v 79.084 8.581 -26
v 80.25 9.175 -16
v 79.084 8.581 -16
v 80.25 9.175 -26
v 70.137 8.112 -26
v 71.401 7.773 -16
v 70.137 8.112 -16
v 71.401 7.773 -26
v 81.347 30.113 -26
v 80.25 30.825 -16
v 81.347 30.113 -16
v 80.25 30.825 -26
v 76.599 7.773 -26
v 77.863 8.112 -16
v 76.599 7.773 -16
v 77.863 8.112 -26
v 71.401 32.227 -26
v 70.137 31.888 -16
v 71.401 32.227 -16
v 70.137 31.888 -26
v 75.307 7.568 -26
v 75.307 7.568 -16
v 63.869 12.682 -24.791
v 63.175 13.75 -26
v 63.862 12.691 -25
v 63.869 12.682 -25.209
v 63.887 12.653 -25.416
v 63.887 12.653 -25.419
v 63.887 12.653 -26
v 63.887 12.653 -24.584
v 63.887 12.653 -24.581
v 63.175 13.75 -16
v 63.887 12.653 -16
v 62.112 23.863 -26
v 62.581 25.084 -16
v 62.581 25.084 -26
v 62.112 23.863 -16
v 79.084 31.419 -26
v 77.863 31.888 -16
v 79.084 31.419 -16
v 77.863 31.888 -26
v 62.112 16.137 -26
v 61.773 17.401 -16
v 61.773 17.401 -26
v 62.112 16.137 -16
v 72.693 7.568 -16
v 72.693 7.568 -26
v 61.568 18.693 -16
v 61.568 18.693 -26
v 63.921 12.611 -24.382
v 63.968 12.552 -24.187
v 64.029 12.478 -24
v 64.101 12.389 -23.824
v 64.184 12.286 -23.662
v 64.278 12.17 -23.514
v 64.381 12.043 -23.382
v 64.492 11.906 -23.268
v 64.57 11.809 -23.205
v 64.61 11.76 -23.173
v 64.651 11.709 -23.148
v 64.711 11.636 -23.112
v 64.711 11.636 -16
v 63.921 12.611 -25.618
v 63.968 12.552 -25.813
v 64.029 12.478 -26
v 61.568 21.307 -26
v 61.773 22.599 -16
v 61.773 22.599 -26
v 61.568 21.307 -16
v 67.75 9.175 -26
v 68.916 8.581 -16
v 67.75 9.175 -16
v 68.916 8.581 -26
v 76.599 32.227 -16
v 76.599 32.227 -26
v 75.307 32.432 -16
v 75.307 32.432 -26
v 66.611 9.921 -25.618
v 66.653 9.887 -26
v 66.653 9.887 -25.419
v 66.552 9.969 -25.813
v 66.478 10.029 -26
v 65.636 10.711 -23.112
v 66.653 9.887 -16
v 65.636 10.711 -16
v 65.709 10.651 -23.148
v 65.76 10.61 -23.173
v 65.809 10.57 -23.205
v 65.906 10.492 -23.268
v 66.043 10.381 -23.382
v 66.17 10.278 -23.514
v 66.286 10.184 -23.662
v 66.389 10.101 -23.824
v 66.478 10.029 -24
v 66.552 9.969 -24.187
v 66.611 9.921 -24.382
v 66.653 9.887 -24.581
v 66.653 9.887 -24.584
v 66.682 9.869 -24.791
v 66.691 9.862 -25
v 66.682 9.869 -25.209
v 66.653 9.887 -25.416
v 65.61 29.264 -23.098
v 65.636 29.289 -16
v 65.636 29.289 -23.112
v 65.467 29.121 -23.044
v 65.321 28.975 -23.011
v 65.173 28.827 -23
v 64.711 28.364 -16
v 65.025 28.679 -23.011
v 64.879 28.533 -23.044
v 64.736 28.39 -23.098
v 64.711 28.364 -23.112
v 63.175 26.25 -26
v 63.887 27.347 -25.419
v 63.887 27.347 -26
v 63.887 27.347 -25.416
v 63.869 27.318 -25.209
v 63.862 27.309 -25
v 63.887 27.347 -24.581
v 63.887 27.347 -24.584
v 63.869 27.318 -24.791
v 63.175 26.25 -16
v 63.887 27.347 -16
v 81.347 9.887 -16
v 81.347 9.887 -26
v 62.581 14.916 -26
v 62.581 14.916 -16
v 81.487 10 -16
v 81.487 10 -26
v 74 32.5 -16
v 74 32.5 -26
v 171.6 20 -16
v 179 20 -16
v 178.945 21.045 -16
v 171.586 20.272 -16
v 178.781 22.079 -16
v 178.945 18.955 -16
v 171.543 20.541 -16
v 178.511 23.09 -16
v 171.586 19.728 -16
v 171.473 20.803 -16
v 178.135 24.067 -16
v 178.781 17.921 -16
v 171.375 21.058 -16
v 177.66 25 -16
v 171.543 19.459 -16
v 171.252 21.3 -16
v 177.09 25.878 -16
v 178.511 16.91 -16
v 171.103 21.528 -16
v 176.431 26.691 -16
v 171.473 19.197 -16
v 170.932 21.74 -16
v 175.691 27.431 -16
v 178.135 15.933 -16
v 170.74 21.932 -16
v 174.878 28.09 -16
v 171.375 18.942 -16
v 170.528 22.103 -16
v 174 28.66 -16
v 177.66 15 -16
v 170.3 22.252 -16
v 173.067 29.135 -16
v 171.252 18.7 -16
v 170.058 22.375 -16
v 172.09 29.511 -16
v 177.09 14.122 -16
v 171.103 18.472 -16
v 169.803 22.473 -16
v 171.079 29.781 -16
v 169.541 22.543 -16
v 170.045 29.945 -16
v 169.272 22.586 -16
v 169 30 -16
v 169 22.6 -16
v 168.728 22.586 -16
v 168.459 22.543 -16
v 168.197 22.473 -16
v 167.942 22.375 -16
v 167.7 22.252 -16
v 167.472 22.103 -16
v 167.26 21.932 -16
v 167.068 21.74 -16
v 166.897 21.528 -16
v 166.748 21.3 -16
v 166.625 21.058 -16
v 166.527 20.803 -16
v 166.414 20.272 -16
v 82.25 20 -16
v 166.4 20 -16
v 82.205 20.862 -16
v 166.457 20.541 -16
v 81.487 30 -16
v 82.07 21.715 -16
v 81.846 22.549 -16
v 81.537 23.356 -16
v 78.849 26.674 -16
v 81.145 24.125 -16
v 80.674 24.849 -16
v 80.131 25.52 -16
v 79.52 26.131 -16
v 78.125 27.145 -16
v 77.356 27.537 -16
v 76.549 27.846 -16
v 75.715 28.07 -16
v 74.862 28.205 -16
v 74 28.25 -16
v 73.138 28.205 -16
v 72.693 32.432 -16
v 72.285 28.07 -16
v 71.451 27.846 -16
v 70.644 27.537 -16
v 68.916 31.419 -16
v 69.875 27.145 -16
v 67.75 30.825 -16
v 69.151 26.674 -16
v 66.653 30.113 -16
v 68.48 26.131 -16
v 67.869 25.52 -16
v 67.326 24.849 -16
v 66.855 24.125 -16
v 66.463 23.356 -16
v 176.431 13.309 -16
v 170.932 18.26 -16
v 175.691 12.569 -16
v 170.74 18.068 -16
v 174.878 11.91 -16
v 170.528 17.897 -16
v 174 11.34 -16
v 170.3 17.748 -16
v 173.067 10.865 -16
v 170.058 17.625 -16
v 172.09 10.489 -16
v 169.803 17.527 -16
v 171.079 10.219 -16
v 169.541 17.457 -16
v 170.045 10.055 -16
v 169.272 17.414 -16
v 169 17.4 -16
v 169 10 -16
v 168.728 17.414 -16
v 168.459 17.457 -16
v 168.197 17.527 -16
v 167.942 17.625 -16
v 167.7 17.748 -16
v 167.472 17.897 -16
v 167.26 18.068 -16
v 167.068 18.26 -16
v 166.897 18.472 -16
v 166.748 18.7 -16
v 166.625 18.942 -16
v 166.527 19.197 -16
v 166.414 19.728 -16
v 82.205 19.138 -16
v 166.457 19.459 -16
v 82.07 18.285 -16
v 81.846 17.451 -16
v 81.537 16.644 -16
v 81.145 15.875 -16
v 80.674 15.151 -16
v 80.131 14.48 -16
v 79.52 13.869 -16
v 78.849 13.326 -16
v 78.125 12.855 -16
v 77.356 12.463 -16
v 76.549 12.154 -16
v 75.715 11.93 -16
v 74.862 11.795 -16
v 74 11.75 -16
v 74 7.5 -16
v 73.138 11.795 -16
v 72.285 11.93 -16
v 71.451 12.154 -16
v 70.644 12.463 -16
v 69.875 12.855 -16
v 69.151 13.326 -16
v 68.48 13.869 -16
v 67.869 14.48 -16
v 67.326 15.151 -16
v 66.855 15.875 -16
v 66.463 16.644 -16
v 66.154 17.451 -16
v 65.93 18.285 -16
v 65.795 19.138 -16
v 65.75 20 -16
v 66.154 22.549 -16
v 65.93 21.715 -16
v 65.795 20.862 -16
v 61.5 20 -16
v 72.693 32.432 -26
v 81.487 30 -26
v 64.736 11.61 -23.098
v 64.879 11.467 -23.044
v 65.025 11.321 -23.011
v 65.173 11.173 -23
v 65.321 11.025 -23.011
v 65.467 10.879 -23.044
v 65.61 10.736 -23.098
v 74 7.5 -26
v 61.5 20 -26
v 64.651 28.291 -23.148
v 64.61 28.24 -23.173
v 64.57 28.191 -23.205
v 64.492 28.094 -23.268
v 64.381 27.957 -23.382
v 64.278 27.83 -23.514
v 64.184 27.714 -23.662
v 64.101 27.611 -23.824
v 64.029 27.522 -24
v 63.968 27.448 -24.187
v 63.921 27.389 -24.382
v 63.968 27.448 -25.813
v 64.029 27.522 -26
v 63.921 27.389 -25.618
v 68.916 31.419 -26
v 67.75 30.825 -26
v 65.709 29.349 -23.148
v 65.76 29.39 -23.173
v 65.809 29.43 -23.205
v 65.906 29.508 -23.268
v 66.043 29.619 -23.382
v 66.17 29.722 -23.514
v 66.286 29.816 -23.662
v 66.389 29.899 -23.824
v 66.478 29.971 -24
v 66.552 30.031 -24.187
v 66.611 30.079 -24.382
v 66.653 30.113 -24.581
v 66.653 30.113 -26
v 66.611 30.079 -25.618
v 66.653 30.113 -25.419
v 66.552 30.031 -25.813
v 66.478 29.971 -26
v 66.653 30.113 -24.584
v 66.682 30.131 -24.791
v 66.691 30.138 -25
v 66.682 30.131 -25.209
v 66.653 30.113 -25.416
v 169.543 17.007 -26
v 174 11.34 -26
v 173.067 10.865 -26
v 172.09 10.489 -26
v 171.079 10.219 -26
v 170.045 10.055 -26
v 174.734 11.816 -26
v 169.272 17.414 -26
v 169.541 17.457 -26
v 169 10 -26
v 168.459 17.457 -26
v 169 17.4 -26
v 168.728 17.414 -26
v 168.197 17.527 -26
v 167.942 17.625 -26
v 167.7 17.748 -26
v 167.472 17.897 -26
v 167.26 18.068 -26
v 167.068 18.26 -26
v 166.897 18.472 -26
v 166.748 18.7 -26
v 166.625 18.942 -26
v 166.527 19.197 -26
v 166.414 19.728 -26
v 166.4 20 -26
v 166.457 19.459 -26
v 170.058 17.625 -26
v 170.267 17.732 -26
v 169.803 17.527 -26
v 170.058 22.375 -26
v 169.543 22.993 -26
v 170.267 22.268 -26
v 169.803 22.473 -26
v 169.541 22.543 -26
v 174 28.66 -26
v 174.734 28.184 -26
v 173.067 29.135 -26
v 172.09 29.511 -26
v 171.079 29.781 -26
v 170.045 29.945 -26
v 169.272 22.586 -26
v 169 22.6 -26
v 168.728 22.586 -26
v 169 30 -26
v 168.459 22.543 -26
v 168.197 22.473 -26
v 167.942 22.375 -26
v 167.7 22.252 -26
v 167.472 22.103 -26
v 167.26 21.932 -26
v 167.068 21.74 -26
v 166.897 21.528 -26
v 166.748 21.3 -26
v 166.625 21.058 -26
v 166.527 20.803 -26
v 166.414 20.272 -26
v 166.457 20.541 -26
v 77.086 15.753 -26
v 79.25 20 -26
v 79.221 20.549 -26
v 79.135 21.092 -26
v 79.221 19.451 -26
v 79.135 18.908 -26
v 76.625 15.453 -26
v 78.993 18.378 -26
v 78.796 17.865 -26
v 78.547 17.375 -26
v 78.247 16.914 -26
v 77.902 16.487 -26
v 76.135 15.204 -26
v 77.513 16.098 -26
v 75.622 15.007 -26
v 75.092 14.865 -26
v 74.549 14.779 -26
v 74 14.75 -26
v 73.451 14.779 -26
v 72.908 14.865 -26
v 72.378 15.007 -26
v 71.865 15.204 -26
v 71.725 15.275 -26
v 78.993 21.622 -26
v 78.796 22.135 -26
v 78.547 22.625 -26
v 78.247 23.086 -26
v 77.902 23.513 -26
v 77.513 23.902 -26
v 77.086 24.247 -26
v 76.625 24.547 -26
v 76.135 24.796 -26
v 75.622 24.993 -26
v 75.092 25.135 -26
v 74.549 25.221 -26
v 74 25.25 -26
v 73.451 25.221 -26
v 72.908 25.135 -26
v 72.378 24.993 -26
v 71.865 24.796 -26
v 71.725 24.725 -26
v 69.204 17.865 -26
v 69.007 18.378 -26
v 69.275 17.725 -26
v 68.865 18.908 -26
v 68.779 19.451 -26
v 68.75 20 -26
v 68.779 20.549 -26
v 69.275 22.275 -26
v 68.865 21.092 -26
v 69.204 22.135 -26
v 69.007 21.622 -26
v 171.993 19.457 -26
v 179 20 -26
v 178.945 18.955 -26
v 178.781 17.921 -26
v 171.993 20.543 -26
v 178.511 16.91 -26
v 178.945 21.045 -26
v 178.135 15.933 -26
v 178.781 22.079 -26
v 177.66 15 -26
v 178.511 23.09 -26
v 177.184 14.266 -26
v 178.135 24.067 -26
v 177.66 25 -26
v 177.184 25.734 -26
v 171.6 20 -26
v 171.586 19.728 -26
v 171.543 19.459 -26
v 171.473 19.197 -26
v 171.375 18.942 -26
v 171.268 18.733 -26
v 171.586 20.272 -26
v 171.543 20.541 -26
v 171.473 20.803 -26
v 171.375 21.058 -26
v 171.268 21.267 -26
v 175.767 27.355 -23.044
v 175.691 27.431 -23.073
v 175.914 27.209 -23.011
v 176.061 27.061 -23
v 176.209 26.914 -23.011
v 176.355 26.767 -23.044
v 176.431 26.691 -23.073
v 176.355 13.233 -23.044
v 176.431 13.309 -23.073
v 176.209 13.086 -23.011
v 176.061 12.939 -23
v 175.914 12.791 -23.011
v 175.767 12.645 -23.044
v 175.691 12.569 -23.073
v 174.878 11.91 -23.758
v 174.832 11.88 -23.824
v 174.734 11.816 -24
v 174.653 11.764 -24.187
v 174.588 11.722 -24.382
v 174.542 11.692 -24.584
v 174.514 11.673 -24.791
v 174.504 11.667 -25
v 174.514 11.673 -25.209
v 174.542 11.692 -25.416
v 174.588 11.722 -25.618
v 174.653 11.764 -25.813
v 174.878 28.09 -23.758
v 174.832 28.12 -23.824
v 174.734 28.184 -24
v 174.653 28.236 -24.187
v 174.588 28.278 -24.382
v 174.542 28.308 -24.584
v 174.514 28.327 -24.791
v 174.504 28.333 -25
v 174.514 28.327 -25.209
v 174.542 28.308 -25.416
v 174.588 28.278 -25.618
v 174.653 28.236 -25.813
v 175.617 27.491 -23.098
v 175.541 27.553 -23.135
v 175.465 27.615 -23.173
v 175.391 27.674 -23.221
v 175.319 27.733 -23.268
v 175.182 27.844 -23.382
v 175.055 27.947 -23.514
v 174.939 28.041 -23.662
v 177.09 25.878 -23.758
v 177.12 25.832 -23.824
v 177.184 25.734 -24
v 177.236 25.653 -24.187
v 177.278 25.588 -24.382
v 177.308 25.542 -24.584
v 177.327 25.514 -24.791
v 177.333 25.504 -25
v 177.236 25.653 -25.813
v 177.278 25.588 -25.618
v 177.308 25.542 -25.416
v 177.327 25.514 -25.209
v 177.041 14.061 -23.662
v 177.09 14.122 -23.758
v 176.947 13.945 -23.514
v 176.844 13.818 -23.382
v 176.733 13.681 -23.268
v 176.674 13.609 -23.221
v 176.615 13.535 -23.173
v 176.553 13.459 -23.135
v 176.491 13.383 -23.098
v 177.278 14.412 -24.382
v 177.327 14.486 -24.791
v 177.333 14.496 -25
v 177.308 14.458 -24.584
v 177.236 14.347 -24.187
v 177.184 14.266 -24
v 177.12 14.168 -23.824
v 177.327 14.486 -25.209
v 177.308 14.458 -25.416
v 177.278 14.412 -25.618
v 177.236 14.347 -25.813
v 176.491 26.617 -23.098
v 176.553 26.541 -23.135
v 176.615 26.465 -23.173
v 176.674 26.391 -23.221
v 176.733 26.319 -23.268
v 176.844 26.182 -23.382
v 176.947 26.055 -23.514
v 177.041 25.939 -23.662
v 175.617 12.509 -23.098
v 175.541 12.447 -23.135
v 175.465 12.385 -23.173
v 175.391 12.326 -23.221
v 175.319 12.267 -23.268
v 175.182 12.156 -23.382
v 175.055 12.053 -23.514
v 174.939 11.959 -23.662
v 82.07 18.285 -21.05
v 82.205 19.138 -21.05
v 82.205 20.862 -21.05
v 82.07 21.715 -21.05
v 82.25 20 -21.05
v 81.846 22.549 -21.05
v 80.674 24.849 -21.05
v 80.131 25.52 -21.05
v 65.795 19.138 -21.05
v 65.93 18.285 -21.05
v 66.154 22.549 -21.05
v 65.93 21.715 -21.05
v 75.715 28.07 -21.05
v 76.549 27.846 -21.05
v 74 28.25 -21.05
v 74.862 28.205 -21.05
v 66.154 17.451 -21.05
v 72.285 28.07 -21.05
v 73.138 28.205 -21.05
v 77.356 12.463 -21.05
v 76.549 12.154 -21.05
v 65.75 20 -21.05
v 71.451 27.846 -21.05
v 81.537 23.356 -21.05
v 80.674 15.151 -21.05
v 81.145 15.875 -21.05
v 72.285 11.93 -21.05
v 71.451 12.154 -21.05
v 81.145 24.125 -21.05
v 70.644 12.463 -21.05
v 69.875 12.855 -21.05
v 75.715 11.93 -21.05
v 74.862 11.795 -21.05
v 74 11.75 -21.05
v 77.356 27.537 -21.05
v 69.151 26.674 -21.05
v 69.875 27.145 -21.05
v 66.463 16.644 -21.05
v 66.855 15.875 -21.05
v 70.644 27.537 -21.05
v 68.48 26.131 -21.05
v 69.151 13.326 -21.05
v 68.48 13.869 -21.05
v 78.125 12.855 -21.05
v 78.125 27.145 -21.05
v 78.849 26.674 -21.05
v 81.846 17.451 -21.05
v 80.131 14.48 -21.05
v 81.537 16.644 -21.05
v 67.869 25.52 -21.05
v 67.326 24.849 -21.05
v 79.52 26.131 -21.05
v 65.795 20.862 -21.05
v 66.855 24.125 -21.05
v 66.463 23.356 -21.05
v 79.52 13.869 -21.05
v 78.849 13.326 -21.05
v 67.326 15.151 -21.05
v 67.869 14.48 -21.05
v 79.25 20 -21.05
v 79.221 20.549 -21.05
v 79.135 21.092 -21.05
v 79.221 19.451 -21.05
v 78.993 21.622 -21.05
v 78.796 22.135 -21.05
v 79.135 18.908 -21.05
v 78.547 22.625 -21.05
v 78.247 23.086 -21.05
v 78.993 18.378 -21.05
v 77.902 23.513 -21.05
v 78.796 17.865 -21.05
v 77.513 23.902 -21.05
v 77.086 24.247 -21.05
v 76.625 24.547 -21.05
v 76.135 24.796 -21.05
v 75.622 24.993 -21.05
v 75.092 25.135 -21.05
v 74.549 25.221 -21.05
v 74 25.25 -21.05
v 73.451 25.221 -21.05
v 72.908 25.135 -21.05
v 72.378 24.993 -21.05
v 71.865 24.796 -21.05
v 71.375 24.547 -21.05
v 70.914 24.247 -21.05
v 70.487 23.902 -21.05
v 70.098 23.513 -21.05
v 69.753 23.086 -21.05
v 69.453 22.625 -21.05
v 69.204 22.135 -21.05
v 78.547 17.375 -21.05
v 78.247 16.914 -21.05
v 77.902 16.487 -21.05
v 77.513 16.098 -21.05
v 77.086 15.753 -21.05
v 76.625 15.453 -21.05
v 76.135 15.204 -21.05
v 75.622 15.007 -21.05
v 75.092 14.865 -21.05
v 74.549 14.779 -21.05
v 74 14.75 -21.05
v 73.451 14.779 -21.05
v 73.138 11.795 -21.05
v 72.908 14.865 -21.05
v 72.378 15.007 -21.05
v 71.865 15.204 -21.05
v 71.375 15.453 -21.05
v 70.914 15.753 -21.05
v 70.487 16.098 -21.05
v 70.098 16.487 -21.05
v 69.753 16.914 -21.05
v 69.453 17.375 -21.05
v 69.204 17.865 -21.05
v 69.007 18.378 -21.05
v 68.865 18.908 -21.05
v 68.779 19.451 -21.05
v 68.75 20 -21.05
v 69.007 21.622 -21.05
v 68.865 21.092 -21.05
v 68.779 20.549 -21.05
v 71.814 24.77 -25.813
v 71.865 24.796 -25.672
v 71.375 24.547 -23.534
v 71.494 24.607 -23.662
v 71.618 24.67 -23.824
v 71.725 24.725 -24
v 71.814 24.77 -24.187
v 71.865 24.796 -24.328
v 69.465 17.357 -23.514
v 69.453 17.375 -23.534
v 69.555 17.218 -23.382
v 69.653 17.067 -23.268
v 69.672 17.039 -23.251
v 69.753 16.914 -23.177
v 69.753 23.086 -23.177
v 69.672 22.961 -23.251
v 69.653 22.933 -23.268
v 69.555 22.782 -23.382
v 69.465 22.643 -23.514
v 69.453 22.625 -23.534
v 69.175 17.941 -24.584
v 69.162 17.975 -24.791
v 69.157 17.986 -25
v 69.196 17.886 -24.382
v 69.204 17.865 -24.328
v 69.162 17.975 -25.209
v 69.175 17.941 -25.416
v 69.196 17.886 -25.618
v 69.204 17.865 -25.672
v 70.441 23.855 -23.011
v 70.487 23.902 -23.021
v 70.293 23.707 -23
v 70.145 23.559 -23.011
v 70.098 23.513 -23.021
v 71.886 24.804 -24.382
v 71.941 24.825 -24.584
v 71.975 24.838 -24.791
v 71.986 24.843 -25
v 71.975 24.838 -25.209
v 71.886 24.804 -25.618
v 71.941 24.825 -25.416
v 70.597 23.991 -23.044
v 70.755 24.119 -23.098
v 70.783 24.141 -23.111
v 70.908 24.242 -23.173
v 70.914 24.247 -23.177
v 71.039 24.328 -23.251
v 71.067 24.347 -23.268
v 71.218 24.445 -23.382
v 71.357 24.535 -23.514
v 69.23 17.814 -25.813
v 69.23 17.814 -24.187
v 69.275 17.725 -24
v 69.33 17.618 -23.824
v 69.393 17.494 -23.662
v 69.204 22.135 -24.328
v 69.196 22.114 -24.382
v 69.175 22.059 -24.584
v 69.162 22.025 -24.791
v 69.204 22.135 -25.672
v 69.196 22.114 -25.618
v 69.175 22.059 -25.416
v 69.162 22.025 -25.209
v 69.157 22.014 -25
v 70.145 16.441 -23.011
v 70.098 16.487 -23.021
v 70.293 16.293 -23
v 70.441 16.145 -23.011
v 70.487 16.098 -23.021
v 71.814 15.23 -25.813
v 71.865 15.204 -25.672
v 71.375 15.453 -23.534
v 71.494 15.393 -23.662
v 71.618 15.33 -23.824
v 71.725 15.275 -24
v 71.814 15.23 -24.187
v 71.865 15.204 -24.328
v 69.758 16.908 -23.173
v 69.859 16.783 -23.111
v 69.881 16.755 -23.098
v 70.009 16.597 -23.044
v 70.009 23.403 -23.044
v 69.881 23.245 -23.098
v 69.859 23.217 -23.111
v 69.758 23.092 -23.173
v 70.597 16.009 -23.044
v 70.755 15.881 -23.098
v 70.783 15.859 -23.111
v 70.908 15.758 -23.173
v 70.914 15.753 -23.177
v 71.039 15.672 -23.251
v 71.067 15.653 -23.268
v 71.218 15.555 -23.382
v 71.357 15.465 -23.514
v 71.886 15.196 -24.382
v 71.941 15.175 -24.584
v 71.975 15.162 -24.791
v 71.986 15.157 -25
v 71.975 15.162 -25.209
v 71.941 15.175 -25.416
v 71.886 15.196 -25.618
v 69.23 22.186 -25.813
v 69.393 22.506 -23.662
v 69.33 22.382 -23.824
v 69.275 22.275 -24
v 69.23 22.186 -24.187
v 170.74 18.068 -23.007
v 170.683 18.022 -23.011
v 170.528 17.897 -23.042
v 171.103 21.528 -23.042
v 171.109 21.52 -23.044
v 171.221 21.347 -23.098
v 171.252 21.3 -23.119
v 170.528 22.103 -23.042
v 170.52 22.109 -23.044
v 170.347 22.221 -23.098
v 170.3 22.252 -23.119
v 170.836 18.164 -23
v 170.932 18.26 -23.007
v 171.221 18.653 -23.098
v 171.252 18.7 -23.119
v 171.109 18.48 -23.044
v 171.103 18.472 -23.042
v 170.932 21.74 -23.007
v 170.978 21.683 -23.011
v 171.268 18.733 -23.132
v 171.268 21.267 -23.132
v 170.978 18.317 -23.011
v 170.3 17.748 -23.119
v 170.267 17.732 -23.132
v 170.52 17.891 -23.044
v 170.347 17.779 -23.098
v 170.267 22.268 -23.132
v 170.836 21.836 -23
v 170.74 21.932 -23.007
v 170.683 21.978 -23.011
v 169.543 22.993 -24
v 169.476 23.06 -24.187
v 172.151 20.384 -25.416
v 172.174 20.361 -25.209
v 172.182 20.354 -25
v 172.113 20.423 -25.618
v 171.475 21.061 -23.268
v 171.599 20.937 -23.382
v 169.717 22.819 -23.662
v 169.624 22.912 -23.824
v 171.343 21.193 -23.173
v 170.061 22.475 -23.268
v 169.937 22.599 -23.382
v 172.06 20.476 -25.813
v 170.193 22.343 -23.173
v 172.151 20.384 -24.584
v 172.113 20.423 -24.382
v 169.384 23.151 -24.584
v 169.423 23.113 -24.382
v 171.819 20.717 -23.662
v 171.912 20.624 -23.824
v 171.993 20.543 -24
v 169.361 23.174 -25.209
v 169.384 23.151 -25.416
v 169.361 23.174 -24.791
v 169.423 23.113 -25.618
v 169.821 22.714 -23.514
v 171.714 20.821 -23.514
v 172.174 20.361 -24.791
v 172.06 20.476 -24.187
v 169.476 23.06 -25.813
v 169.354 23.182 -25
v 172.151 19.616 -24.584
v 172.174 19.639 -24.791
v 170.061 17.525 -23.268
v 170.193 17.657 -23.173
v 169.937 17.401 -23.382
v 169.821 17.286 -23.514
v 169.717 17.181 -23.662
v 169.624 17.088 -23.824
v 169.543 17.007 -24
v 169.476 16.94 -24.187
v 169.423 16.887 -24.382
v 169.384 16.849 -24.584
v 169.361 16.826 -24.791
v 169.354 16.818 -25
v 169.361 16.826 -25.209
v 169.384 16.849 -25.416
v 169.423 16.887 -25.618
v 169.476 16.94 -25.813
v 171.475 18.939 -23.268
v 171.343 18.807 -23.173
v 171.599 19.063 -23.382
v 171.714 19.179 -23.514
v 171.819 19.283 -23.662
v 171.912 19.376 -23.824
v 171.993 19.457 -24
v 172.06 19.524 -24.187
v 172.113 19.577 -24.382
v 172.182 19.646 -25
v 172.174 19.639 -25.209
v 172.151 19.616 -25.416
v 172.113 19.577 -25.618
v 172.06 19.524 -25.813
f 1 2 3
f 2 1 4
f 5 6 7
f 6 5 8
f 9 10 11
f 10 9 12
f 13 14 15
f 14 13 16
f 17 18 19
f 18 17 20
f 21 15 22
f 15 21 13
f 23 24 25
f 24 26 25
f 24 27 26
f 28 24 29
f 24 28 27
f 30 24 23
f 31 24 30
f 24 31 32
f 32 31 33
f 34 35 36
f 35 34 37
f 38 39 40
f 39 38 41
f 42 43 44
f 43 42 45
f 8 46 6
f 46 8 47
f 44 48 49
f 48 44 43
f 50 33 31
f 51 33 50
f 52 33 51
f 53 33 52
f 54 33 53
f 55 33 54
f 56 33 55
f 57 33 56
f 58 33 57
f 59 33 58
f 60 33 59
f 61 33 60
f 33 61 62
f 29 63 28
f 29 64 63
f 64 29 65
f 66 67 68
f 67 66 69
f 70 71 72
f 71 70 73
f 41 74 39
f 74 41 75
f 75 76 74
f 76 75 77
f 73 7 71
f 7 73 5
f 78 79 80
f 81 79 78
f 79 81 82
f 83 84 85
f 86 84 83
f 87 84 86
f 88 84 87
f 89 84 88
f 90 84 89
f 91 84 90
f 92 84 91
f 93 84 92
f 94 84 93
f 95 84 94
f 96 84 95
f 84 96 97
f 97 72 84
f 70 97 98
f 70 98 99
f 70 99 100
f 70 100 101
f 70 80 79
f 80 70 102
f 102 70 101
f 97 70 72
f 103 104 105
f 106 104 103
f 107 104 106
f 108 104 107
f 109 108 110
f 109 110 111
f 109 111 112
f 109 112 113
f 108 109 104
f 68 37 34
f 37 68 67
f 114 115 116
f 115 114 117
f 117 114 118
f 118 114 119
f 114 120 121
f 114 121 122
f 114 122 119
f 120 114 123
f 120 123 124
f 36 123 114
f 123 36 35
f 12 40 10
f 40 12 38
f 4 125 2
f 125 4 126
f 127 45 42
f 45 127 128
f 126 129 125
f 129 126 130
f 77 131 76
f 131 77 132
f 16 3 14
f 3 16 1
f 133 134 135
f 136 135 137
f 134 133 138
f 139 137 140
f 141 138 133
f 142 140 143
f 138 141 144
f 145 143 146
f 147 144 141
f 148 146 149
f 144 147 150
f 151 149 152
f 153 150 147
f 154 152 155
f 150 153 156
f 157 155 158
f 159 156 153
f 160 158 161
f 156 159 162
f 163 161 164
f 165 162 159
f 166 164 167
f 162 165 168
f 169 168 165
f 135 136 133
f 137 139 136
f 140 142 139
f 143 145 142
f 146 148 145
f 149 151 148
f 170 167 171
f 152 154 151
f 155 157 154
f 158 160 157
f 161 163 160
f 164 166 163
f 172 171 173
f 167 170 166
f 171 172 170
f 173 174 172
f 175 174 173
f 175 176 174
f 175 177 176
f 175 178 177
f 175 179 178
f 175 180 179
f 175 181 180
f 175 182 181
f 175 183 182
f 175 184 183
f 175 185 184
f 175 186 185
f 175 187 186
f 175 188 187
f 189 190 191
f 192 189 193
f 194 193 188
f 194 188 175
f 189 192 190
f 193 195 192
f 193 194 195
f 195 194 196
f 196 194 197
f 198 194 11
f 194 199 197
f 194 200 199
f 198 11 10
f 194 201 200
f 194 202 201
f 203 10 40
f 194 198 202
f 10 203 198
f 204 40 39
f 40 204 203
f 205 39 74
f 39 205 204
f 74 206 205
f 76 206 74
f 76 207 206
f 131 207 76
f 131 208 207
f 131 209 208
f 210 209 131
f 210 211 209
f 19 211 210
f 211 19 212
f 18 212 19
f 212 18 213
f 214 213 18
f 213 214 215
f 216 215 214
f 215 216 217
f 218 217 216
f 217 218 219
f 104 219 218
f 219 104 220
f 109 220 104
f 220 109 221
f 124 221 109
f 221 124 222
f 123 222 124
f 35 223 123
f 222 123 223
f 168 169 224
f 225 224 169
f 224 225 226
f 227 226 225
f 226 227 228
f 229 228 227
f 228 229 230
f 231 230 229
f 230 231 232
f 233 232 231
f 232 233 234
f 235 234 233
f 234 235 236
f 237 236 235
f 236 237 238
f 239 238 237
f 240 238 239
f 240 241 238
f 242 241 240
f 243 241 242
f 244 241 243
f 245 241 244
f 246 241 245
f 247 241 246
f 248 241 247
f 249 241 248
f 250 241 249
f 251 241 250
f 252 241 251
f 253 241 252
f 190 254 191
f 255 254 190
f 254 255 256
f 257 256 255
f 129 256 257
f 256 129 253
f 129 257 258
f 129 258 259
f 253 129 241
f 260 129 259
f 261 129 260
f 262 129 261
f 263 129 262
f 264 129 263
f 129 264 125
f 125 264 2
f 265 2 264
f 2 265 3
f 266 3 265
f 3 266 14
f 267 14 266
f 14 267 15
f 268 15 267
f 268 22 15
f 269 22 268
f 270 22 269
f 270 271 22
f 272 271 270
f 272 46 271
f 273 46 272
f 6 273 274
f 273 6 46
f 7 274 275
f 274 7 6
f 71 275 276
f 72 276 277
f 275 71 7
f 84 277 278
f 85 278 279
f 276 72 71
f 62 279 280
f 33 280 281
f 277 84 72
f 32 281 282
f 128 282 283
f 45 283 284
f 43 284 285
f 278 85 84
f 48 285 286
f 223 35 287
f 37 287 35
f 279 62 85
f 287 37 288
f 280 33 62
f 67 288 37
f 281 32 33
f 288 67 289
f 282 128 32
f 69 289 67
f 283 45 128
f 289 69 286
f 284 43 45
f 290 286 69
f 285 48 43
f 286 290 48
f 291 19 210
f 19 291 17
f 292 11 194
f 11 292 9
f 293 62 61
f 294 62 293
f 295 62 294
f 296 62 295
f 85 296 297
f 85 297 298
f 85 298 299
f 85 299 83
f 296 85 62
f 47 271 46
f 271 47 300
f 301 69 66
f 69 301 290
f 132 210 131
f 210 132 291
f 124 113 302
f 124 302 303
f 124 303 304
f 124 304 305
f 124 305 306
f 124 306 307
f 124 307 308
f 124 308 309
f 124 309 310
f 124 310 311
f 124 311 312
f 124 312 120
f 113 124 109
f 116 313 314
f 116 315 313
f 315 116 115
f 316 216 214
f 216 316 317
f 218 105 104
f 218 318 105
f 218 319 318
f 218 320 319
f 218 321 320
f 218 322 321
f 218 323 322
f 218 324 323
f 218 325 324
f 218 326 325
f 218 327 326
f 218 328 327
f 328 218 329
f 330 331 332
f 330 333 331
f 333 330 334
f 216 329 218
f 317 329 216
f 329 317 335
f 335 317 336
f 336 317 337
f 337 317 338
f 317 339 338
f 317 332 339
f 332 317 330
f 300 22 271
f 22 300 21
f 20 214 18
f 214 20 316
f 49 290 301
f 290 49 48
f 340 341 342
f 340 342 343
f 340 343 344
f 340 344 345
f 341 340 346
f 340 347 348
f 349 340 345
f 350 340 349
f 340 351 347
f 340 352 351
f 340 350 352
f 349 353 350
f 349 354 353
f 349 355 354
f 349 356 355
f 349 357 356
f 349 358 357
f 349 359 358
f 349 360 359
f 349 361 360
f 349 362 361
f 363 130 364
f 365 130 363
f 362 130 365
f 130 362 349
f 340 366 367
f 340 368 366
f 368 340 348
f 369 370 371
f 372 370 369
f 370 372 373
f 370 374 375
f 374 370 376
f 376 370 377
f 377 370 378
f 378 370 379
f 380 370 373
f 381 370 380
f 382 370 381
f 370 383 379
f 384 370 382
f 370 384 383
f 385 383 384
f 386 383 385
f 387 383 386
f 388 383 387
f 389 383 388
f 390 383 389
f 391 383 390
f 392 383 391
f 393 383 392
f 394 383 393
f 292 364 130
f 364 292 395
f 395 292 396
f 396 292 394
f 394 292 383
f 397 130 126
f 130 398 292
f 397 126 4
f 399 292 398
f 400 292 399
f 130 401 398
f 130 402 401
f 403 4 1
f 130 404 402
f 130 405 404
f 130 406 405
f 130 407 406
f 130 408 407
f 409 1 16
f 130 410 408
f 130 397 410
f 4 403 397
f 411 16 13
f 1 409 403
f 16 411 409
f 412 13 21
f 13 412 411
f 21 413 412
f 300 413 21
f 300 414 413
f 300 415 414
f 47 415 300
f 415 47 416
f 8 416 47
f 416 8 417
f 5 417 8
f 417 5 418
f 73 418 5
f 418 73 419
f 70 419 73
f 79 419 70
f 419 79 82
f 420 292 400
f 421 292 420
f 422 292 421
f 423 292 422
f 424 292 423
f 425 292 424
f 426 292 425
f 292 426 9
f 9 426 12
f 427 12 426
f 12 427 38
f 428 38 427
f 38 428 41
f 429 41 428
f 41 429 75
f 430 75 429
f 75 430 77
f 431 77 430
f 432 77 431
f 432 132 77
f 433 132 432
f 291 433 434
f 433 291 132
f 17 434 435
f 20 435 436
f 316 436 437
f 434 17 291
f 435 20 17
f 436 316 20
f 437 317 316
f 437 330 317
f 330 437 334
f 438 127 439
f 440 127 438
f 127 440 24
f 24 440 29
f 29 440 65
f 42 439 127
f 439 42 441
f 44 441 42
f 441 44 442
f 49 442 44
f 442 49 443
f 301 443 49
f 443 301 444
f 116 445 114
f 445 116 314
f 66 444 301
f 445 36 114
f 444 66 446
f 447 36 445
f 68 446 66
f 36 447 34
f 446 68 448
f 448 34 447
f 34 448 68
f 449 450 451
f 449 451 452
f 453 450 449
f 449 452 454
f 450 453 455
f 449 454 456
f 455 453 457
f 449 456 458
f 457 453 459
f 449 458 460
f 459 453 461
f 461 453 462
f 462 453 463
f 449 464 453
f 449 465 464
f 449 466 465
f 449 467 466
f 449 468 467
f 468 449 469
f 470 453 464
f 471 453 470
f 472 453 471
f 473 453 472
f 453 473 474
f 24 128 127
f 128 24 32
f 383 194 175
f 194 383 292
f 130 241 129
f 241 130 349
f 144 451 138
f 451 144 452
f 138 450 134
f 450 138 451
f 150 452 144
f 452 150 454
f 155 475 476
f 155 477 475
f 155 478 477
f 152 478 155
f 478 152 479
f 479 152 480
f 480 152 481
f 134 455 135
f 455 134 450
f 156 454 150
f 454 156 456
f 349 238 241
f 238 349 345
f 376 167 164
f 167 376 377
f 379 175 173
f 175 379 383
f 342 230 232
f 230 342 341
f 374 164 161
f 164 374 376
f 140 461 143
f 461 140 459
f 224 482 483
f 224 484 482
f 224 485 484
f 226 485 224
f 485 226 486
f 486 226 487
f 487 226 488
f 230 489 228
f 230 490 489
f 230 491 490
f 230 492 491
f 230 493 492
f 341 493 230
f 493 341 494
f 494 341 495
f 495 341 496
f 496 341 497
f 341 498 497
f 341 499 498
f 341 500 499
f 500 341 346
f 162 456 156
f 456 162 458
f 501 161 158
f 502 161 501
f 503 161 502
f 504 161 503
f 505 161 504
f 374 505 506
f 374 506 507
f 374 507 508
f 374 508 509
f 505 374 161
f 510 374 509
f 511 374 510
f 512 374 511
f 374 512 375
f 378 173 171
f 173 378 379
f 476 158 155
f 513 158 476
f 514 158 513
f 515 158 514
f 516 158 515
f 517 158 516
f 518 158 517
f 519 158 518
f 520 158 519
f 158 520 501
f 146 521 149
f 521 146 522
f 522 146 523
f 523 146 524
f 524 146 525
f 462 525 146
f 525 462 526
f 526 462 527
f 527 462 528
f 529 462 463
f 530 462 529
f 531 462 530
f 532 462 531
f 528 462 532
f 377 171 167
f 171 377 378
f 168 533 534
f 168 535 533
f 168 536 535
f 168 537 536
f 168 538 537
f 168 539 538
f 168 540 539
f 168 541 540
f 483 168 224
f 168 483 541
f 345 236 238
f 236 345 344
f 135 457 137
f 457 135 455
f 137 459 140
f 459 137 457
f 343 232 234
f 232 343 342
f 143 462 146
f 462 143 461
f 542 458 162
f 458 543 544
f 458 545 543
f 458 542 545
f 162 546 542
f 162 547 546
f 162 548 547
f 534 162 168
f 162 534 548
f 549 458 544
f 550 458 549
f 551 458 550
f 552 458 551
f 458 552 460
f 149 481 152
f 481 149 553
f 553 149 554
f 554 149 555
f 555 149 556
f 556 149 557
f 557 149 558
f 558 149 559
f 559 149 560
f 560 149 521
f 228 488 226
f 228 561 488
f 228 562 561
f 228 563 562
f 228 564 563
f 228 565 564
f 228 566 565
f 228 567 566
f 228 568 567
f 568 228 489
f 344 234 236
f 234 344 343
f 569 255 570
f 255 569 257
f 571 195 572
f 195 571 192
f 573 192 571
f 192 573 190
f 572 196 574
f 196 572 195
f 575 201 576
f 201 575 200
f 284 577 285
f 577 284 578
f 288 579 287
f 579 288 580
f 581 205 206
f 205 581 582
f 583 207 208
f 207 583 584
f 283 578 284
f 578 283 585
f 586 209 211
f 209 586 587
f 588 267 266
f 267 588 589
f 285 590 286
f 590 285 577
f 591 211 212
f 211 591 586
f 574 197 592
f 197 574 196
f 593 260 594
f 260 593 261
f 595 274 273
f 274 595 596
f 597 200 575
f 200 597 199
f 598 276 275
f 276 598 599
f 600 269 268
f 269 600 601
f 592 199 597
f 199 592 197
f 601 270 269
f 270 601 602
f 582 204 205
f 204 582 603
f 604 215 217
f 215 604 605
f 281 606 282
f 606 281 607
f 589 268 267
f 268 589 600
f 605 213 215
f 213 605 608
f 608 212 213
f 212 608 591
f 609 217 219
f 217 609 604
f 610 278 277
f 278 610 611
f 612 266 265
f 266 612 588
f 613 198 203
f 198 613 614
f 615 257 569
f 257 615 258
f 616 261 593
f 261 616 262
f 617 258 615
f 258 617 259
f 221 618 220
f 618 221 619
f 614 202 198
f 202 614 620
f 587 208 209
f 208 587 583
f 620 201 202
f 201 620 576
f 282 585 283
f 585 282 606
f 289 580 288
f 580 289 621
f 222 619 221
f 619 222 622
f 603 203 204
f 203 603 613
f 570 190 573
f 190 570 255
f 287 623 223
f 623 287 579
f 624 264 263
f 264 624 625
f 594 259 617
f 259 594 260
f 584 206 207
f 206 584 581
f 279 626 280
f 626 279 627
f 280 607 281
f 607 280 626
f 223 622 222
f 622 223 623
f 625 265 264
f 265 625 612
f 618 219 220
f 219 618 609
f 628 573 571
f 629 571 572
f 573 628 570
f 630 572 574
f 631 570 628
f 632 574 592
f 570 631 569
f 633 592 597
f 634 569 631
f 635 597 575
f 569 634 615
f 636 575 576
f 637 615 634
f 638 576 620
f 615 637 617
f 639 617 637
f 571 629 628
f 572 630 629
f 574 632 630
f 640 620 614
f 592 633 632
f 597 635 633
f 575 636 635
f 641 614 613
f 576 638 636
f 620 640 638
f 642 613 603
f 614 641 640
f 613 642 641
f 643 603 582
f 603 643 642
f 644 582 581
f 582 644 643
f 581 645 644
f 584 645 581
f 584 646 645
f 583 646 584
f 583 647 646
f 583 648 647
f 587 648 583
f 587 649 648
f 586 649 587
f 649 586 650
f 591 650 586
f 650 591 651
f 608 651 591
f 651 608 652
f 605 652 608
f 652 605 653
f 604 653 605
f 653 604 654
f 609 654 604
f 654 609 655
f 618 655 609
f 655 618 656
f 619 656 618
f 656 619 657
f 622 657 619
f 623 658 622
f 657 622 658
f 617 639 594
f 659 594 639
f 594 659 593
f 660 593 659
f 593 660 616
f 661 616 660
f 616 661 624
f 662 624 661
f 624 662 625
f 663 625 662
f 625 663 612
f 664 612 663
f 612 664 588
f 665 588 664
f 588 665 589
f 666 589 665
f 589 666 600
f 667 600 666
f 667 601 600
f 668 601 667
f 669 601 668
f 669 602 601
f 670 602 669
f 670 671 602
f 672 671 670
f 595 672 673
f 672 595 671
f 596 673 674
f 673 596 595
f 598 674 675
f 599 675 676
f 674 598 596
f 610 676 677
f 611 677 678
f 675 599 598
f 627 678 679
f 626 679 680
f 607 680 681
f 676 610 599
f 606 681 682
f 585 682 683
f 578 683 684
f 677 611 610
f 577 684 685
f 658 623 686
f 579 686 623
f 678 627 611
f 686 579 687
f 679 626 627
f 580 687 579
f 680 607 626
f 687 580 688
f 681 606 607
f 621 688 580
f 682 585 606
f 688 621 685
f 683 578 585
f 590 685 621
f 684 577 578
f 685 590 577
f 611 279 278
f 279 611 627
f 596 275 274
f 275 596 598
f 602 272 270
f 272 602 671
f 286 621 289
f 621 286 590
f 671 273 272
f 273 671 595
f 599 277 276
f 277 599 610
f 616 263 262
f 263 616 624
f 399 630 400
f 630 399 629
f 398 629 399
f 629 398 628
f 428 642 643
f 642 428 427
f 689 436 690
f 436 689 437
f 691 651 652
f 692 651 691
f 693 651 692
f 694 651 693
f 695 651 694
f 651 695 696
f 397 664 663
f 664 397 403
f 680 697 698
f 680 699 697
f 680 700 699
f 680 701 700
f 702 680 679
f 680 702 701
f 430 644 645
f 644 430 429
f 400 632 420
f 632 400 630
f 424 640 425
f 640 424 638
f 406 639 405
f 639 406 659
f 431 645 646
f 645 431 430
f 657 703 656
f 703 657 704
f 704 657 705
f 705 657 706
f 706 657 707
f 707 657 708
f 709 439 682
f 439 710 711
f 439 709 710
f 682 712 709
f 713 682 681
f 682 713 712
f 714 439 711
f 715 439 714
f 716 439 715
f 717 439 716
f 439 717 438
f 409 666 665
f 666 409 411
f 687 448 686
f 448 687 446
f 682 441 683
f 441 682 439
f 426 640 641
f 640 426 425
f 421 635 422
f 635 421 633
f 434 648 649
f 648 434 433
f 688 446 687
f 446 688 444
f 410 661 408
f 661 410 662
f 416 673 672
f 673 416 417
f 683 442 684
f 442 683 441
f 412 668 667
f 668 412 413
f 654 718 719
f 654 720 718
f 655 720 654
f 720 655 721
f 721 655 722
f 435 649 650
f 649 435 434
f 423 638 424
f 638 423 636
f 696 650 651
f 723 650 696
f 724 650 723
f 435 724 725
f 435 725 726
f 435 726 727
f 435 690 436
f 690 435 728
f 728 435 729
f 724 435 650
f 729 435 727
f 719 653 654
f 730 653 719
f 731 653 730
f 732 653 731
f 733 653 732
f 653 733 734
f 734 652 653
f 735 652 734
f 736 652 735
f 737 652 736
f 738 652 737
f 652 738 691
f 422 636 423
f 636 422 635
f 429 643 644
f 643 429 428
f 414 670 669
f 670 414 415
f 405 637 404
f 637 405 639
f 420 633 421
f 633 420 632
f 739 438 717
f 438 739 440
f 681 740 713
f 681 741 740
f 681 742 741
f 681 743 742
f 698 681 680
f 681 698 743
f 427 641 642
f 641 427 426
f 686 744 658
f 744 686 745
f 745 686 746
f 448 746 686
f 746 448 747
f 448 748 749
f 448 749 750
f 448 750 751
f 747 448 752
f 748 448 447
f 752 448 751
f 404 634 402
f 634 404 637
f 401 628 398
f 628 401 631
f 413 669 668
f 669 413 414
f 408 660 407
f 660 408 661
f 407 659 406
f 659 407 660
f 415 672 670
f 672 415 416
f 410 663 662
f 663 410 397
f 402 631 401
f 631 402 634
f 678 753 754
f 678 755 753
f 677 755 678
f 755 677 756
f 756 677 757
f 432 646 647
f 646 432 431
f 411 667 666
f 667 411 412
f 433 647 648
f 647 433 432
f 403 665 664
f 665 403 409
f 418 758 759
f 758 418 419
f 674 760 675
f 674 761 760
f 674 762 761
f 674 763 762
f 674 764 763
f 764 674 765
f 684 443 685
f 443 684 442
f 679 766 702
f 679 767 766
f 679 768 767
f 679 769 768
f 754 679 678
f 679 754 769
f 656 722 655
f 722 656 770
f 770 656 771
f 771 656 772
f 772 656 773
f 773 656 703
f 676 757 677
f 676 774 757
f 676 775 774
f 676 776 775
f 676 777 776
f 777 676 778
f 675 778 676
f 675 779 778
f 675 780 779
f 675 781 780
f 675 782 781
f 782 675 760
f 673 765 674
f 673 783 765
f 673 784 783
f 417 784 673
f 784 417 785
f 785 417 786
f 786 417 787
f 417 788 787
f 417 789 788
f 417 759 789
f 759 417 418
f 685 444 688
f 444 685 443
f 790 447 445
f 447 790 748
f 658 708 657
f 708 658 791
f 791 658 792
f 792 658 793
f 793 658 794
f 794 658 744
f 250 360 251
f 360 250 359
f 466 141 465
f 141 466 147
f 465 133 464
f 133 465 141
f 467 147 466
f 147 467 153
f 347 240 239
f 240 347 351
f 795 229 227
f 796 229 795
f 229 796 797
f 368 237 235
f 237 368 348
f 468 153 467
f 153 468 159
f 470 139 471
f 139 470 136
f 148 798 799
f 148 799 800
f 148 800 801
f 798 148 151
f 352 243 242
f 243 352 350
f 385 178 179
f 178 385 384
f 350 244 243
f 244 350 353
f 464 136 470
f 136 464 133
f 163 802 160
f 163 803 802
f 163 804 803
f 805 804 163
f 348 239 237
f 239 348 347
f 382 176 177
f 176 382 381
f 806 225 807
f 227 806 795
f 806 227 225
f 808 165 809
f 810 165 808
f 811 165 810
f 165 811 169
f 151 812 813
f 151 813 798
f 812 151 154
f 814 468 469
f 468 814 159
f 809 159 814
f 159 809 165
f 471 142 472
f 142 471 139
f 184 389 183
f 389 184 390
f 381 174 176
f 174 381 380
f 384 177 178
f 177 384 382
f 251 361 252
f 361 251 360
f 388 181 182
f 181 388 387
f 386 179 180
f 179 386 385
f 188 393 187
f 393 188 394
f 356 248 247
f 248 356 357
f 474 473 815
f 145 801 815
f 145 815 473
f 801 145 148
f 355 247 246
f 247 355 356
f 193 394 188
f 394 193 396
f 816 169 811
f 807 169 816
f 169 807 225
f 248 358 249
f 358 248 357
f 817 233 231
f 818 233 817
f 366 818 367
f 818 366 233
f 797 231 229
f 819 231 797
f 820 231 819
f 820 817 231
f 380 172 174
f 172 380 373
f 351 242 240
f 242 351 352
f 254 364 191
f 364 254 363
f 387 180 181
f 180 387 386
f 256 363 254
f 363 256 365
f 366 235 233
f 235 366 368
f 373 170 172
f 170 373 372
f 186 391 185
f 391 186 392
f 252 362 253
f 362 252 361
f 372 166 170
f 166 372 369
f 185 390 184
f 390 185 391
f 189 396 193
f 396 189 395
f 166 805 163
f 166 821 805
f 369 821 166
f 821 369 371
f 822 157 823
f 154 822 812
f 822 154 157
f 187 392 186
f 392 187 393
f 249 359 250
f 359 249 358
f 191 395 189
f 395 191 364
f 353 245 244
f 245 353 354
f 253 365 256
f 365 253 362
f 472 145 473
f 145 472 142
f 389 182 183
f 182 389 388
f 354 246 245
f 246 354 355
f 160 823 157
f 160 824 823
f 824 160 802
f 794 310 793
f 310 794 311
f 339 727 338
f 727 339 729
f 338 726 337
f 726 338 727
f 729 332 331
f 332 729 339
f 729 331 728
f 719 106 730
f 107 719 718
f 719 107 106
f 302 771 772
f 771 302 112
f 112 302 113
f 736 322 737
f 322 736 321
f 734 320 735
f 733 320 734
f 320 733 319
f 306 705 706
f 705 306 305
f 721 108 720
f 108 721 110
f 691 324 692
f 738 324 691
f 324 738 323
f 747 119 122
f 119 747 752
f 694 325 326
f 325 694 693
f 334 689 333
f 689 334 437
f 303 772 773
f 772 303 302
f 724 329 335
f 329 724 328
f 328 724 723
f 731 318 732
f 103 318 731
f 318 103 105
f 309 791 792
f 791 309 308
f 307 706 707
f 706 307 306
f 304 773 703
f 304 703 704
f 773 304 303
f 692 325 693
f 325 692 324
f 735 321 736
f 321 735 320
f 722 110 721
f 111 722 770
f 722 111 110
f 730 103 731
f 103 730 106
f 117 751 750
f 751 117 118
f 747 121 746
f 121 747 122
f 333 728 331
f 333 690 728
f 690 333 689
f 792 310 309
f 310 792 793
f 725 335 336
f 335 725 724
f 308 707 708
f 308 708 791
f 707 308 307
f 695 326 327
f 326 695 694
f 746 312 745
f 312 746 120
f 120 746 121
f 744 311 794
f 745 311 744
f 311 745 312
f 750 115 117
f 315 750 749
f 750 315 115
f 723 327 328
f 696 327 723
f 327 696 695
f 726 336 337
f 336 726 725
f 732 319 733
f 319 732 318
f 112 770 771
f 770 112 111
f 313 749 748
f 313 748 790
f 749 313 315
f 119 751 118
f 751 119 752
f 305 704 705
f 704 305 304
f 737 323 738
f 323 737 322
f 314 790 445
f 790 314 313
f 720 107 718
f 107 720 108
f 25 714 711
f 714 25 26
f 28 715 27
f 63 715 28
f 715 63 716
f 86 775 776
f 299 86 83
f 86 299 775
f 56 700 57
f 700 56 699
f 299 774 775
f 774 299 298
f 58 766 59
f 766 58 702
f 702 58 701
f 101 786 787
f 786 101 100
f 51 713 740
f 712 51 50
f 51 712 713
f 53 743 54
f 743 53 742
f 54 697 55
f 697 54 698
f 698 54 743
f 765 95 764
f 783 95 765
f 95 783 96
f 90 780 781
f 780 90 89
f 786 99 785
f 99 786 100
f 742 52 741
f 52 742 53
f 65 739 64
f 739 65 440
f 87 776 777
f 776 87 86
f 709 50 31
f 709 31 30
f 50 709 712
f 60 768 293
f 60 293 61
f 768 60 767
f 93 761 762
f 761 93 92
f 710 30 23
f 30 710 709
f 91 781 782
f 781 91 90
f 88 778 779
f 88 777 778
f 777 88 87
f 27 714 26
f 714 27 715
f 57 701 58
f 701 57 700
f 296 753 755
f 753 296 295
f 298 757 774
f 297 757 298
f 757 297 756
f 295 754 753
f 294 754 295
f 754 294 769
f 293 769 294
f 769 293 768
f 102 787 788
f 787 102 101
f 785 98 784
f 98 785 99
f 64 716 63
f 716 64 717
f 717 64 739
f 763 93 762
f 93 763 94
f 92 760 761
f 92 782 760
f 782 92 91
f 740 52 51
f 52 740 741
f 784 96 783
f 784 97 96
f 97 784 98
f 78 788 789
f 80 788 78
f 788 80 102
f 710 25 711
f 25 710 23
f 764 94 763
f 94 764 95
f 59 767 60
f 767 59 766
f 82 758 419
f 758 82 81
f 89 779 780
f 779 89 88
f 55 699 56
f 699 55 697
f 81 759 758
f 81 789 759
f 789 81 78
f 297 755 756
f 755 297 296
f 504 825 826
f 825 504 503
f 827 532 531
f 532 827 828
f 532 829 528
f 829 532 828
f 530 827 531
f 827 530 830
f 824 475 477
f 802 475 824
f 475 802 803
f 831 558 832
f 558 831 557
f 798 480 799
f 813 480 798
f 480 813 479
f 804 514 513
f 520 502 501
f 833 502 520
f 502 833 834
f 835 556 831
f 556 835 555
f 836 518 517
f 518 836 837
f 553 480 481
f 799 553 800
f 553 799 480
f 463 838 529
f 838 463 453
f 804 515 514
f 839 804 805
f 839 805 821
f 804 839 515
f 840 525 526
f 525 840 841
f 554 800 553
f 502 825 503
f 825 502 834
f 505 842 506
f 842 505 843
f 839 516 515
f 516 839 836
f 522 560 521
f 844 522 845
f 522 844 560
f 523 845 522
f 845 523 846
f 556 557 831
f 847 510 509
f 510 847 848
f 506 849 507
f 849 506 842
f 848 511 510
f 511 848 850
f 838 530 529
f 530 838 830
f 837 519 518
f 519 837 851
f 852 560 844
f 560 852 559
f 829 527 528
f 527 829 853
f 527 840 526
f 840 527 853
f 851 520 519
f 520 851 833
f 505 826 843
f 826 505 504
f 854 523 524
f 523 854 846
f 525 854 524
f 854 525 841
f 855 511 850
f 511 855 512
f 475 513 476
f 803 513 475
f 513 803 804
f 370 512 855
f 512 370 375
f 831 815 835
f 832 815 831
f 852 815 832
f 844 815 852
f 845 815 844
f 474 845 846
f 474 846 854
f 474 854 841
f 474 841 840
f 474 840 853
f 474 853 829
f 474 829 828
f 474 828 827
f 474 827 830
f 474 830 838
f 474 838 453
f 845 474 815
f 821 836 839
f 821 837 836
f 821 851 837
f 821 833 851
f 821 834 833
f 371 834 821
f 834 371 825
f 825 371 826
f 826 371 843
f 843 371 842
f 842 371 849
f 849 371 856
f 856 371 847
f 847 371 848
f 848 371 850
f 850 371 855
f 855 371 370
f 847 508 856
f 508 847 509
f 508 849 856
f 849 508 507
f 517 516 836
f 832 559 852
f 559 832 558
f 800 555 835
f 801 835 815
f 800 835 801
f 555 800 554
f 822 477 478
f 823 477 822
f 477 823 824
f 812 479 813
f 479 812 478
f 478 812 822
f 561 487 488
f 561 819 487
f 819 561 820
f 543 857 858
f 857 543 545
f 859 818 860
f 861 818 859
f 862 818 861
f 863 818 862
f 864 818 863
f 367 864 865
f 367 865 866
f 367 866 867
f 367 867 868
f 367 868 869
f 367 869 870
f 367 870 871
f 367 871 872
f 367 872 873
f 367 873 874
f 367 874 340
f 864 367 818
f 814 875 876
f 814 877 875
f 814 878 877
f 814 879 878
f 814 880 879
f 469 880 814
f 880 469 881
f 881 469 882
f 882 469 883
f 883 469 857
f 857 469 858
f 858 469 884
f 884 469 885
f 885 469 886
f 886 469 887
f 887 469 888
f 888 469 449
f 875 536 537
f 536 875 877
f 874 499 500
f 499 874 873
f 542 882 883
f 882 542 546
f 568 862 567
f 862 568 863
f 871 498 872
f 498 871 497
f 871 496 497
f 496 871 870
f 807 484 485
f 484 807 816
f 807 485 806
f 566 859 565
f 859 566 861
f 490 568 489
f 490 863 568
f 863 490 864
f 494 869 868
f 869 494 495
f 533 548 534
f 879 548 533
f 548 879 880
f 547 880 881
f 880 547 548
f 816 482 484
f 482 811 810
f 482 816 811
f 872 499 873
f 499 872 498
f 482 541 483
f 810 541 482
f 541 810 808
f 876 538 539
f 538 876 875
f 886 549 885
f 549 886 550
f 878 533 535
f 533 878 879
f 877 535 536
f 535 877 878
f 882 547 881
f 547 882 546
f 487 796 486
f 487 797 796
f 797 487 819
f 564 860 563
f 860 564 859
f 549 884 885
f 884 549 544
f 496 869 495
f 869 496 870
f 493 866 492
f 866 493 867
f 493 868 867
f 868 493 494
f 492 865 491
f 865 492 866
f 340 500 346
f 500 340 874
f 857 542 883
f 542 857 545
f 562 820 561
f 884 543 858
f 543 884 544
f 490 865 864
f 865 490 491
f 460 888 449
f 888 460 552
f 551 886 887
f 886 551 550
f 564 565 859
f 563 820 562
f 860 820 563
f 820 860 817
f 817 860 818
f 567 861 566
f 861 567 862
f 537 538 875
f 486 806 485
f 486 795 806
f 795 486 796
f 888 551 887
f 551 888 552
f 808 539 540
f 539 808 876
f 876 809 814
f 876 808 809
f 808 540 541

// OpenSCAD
// conrod.scad
//
//*****************************************************************************
//*             (c) 2017 by David Powell (aka AchiestDragon)                  *
//*****************************************************************************
// Notes :-
// 

//  included libs are none printable parts for positional /cutouts & assembly
//  guides unless otherwise stated


//*****************************************************************************
// Code :-



module conrod();
{
  color("red",1) rotate([-90,0,0])
  translate([74,0,20])
  {
   difference()
    { 
    union()
      {
        translate([0,21,0]){rotate([-90,0,0]){ cylinder(h=10,d=25,center=true,$fn=60);}}
        translate([47.5,21,0]){cube([95,10,20],center=true);}
        translate([95,21,0]){rotate([-90,0,0]){ cylinder(h=10,d=20,center=true,$fn=60);}}
      } 
    translate([0,18.5,0]){rotate([90,0,0]){ cylinder(h=5.1,d=16.5,center=true,$fn=60);}}
    translate([0,18.5,0]){rotate([90,0,0]){ cylinder(h=15.1,d=10.5,center=true,$fn=60);}}
    translate([95,21,0]){rotate([-90,0,0]){ cylinder(h=15,d=5.2,center=true,$fn=60);}}
    translate([0,25,0]){rotate([90,-45,0]){translate([0,10,0]){rotate([-90,0,0]){ cylinder(h=15,d=4,center=true,$fn=60);}}}}
    translate([0,25,0]){rotate([90,-135,0]){translate([0,10,0]){rotate([-90,0,0]){ cylinder(h=15,d=4,center=true,$fn=60);}}}}
    translate([95,25,0]){rotate([90,45,0]){translate([0,10,0]){rotate([-90,0,0]){ cylinder(h=15,d=4,center=true,$fn=60);}}}}
    translate([95,25,0]){rotate([90,135,0]){translate([0,10,0]){rotate([-90,0,0]){ cylinder(h=15,d=4,center=true,$fn=60);}}}}
  }
  }
}
